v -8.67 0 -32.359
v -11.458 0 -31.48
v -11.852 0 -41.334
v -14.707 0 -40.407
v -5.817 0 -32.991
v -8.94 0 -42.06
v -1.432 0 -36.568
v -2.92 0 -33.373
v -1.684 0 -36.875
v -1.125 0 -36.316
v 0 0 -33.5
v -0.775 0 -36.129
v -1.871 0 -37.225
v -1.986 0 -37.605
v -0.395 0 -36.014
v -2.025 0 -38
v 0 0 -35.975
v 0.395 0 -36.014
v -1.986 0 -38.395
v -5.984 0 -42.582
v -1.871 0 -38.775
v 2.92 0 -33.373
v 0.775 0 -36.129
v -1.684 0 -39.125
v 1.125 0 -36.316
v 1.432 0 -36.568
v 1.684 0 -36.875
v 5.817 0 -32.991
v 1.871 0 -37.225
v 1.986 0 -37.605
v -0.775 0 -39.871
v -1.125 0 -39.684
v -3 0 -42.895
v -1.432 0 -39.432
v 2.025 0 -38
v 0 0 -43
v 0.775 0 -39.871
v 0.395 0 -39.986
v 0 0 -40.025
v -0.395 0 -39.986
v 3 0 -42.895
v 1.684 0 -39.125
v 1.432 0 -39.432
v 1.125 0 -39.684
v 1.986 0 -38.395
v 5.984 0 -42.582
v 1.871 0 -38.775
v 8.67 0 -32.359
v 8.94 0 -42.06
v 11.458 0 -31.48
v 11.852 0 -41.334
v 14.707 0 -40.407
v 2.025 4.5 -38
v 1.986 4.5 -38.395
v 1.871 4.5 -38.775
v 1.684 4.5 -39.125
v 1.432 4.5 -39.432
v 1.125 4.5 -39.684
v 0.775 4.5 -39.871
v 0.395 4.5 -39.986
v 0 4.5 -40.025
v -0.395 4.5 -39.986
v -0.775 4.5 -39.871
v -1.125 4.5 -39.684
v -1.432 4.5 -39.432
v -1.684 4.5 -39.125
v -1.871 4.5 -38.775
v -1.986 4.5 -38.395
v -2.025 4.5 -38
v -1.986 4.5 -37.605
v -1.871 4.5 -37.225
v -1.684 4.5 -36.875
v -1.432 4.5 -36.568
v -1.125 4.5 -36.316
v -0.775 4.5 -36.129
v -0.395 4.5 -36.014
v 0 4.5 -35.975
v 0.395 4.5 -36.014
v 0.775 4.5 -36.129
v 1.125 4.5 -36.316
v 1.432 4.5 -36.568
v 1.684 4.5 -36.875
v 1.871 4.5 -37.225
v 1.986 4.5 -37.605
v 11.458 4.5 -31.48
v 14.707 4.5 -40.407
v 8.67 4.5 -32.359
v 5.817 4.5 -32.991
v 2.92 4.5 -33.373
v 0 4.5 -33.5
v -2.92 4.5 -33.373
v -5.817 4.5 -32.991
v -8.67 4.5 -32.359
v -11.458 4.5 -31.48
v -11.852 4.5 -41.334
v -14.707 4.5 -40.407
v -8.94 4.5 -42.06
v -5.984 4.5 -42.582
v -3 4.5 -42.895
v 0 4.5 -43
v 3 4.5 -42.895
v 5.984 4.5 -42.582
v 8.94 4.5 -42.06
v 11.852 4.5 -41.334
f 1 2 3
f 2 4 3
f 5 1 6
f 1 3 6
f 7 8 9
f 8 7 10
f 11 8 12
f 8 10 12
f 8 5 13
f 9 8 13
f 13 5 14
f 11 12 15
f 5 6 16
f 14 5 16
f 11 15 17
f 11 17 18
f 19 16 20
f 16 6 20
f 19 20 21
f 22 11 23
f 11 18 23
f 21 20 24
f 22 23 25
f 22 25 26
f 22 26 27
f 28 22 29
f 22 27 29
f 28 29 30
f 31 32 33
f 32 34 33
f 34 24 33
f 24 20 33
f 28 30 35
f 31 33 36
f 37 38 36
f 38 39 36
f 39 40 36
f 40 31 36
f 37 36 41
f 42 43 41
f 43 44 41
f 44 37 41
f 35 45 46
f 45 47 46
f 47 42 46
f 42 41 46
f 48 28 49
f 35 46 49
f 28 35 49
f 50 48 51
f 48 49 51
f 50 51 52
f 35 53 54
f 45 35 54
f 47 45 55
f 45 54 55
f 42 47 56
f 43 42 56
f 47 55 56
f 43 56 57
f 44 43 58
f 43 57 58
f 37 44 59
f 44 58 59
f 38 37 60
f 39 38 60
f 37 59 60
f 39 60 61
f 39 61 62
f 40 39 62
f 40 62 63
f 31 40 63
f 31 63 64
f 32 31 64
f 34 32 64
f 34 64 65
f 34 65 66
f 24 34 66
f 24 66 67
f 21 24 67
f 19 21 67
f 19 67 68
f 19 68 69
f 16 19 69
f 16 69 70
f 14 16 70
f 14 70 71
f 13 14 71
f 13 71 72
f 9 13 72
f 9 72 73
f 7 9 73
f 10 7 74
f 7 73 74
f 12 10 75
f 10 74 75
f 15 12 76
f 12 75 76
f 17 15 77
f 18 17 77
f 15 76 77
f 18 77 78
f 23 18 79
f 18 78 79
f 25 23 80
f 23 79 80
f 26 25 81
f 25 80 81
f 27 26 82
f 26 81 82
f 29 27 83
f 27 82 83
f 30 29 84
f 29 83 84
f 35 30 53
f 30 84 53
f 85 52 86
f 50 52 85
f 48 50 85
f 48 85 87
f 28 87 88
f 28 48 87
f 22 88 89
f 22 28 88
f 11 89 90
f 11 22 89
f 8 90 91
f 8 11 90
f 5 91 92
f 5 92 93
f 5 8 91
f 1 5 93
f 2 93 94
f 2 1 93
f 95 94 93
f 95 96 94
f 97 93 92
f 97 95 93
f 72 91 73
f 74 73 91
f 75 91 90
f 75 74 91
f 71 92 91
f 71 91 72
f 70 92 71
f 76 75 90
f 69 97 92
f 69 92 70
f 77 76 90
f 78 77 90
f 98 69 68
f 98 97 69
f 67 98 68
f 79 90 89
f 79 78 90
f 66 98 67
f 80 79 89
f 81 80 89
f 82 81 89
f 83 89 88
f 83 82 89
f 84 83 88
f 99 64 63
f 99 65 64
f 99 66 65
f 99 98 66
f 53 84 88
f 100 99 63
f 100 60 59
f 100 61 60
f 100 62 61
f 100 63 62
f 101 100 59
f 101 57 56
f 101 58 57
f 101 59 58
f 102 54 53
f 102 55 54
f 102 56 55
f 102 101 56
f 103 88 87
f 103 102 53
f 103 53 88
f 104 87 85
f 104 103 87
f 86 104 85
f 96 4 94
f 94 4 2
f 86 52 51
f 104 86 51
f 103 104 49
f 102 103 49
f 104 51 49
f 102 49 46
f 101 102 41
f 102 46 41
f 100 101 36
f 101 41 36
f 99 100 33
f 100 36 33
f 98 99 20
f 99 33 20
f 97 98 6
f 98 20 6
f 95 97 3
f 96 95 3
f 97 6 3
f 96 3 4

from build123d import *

# Parameters (mm, degrees)
SKETCH1_R               = 43
SKETCH1_R_2             = 33.5
BOSS_EXTRUDE1_DEPTH     = 4.5
CUT_EXTRUDE1_START      = -5.5
CUT_EXTRUDE1_DEPTH      = 6.5
SKETCH3_R               = 2.025
CUT_EXTRUDE2_DEPTH      = 1
CUT_EXTRUDE2_DEPTH_BACK = 5.5


with BuildPart() as part:
    # Sketch1 → Boss-Extrude1 (new body)
    with BuildSketch(Plane(origin=(0, 0, 0), x_dir=(1, 0, 0), z_dir=(0, 1, 0))):
        Circle(SKETCH1_R)
        Circle(SKETCH1_R_2, mode=Mode.SUBTRACT)
    extrude(amount=BOSS_EXTRUDE1_DEPTH)

    # Sketch2 → Cut-Extrude1 (cut)
    with BuildSketch(Plane(origin=(0, 4.5, 0), x_dir=(1, 0, 0), z_dir=(0, 1, 0)).offset(CUT_EXTRUDE1_START)):
        with BuildLine():
            Line((0, 0), (0, -52.31984462))
            ThreePointArc((0, -52.31984462), (51.524988618, -9.085245674), (17.894440756, 49.16457191))
            Line((17.894440756, 49.16457191), (0, 0))
        make_face()
    cut_extrude1 = extrude(amount=CUT_EXTRUDE1_DEPTH, mode=Mode.SUBTRACT)

    # Mirror1: Cut-Extrude1 across plane
    add(cut_extrude1.mirror(Plane(origin=(0, 0, 0), x_dir=(0, 0, 1), z_dir=(1, 0, 0))), mode=Mode.SUBTRACT)

    # Sketch3 → Cut-Extrude2 (cut, two sides)
    with BuildSketch(Plane(origin=(0, 4.5, 0), x_dir=(1, 0, 0), z_dir=(0, 1, 0))) as cut_extrude2_sk:
        with Locations((0, 38)):
            Circle(SKETCH3_R)
    extrude(amount=CUT_EXTRUDE2_DEPTH, mode=Mode.SUBTRACT)
    extrude(cut_extrude2_sk.sketch, amount=-CUT_EXTRUDE2_DEPTH_BACK, mode=Mode.SUBTRACT)


solid = part.part
